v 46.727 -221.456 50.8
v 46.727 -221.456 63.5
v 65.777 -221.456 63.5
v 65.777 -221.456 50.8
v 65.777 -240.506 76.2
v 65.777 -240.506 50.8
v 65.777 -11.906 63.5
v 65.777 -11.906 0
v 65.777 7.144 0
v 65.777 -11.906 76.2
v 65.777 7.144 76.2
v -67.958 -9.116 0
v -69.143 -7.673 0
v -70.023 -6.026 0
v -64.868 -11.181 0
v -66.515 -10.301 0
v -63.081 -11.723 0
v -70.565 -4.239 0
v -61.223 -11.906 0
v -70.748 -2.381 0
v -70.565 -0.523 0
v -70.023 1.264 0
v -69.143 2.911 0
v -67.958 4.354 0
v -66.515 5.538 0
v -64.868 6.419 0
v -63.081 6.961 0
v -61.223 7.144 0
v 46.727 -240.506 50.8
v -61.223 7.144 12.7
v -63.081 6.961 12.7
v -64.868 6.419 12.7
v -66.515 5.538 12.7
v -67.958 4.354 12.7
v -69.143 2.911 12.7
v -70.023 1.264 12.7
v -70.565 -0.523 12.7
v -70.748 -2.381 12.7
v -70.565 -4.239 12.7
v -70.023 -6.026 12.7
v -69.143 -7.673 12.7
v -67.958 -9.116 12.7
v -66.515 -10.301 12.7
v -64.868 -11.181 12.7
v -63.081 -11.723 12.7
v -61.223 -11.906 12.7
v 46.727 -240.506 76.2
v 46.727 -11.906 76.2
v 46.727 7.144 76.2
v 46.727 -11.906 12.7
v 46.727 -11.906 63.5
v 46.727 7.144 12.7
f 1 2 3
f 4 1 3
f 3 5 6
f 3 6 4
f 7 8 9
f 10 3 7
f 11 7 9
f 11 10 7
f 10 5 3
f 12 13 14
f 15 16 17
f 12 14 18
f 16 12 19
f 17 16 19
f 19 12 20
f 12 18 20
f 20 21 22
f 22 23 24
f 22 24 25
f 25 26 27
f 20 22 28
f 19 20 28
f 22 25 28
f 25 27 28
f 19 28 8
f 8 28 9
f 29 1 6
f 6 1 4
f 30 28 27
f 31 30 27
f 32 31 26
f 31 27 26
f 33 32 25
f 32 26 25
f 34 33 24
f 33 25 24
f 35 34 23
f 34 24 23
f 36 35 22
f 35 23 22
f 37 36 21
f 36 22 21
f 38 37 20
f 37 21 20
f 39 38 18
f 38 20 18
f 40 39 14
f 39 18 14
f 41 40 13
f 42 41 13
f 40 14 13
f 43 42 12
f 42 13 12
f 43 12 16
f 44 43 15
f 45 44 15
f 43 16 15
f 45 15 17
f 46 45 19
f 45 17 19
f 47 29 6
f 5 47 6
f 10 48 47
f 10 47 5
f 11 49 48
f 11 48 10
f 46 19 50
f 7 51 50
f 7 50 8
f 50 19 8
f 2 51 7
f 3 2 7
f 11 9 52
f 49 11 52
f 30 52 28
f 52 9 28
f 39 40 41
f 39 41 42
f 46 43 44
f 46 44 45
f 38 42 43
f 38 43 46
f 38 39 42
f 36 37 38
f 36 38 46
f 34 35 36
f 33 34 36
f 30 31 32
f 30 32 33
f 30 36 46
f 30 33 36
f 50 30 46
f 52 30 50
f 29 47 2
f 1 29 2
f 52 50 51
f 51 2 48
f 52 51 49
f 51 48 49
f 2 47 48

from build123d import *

# Parameters (mm, degrees)
F0_W     = 19.0500000055
F0_H     = 19.05
F1_DEPTH = 12.7
F2_DEPTH = 76.2
F3_W     = 19.05
F3_H     = 209.55
F4_DEPTH = 12.7
F3_H_2   = 19.05
F5_DEPTH = 25.4


# Not quite as in the source:
# - a feature names something its author has since deleted; it is built from what else it names


with BuildPart() as f1:
    # F0 (on Top) → F1 (new body)
    with BuildSketch(Plane.XY):
        with BuildLine():
            Line((46.7271760769, 7.14375), (-61.2228239231, 7.14375))
            ThreePointArc((-61.2228239231, 7.14375), (-70.7478239286, -2.3812499973), (-61.2228239286, -11.90625))
            Line((-61.2228239286, -11.90625), (46.7271760714, -11.90625))
            Line((46.7271760714, -11.90625), (46.7271760769, 7.14375))
        make_face()
        with Locations((56.2521760742, -2.38125)):
            Rectangle(F0_W, F0_H)
    extrude(amount=F1_DEPTH)

    # F0 (on Top) → F2 (join)
    with BuildSketch(Plane.XY):
        with Locations((56.2521760742, -2.38125)):
            Rectangle(F0_W, F0_H)
    extrude(amount=F2_DEPTH)

    # F3 (on face) → F4 (join)
    with BuildSketch(Plane.XY.offset(76.2)):
        with Locations((56.2521760742, -116.68125)):
            Rectangle(F3_W, F3_H)
    extrude(amount=-F4_DEPTH)

    # F3 (on face) → F5 (join)
    with BuildSketch(Plane.XY.offset(76.2)):
        with Locations((56.2521760742, -230.98125)):
            Rectangle(F3_W, F3_H_2)
    extrude(amount=-F5_DEPTH)


with BuildPart() as f6_1:
    # F6: copy of F1
    add(f1.part)


solid = f1.part
